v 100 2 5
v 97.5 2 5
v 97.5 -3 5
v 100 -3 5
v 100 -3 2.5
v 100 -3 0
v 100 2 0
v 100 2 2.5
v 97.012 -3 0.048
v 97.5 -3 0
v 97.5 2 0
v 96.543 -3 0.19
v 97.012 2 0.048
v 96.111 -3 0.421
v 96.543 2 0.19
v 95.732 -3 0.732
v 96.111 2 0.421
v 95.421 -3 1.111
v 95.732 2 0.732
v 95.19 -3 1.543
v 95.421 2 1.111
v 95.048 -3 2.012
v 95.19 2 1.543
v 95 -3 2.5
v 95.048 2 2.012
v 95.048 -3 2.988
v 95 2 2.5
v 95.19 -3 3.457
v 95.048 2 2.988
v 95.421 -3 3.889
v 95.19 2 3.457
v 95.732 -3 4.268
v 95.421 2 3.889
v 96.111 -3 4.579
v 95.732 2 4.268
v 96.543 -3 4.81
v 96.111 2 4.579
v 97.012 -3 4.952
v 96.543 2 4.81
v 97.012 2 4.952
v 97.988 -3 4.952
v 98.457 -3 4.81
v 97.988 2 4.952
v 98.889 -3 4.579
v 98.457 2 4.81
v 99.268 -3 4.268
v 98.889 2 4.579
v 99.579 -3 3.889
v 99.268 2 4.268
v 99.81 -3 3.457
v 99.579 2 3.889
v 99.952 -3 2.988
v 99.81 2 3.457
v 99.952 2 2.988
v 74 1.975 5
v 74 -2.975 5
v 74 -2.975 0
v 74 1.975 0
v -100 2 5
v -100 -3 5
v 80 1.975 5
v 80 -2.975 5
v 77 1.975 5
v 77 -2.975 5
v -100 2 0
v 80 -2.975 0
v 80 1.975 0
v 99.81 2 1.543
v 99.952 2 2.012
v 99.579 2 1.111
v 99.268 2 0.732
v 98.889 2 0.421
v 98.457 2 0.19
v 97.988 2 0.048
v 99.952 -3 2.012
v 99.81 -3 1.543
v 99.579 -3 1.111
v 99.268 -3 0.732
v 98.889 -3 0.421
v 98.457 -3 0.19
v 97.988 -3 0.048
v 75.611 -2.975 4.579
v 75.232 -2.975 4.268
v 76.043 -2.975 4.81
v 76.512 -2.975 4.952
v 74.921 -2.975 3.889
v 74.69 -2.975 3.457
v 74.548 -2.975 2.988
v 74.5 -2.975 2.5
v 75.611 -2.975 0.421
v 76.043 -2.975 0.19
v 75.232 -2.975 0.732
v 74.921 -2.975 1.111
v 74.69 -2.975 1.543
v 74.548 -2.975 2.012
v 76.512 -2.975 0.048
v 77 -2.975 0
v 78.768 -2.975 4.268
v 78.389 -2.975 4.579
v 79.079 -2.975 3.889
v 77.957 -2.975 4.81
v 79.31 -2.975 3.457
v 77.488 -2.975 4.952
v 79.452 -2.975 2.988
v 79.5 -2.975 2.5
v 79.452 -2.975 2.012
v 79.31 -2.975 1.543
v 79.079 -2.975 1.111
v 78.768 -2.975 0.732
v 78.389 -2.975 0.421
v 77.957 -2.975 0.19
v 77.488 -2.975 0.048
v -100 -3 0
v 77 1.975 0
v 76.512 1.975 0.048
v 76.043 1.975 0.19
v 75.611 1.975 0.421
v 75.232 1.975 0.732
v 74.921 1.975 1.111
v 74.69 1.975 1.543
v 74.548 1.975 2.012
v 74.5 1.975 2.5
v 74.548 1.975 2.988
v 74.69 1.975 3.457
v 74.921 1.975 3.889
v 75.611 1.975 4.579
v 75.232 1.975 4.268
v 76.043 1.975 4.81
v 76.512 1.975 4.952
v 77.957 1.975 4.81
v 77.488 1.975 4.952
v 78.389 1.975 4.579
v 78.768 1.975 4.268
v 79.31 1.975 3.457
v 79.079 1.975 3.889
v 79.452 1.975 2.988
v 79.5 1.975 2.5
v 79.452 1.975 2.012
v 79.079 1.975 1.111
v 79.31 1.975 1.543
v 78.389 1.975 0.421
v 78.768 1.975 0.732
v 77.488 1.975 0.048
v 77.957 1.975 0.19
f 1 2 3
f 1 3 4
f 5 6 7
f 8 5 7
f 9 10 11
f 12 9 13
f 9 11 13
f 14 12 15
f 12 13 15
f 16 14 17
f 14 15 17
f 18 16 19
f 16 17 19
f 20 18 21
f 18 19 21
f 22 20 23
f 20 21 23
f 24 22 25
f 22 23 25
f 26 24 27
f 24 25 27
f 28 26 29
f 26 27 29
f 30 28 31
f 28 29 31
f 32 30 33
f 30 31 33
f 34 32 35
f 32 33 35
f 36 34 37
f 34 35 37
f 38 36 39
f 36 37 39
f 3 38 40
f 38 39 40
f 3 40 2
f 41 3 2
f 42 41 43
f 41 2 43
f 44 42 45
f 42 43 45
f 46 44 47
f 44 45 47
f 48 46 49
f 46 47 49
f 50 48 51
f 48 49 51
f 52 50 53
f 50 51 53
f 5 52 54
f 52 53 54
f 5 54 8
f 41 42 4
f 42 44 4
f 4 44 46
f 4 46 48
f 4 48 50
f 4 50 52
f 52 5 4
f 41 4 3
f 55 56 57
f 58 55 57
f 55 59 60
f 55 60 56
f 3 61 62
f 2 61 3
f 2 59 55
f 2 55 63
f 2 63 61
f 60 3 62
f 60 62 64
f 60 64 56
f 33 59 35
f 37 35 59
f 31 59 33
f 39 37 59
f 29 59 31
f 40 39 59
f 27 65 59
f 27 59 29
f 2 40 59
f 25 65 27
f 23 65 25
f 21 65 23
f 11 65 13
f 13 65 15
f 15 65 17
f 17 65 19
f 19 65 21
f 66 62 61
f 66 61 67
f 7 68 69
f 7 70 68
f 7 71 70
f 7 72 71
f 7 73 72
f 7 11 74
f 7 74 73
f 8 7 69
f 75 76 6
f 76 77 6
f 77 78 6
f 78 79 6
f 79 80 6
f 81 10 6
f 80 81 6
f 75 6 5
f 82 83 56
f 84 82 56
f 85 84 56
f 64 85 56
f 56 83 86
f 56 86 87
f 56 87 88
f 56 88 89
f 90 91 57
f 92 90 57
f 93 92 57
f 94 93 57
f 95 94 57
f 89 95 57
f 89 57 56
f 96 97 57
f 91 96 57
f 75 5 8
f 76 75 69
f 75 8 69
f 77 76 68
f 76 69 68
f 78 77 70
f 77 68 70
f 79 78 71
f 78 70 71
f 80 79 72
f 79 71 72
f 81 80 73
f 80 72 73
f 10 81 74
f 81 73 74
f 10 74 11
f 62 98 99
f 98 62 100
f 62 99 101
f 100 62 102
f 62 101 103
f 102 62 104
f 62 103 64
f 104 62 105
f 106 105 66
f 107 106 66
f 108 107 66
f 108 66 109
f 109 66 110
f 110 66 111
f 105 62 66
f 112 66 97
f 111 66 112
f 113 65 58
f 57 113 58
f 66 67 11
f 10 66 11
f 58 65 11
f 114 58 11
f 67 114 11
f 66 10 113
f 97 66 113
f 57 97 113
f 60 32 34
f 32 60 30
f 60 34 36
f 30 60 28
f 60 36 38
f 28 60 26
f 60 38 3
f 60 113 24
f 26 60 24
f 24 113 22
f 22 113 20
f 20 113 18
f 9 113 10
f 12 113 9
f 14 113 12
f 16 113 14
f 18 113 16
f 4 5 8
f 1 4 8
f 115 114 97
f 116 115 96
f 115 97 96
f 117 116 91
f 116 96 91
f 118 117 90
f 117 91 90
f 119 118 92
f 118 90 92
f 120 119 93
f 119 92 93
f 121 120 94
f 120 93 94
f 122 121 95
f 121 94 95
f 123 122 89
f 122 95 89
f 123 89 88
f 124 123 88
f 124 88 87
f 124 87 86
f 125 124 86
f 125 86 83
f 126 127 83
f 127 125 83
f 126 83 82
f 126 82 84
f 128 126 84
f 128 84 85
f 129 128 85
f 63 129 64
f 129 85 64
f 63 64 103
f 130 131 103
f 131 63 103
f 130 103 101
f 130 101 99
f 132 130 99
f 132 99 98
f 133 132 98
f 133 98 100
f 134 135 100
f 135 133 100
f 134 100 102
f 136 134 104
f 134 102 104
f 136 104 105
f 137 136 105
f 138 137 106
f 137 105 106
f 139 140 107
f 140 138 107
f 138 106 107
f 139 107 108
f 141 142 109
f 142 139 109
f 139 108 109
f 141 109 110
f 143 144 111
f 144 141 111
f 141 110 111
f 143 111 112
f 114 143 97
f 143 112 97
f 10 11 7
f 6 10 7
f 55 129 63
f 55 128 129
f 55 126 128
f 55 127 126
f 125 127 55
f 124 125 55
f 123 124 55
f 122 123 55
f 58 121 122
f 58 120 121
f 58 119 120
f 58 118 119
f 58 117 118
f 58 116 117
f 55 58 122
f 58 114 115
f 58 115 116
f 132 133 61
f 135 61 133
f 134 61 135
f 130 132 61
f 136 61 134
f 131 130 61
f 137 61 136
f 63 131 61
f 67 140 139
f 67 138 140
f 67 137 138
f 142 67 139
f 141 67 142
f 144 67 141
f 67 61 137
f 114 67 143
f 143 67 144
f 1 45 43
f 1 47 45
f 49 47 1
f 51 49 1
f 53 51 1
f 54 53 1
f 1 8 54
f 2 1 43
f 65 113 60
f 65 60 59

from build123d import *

# Parameters (mm, degrees)
SKETCH1_W           = 200
SKETCH1_H           = 5
BOSS_EXTRUDE1_DEPTH = 5
SKETCH3_R           = 2.5
BOSS_EXTRUDE3_DEPTH = 5
SKETCH6_R           = 2.5
CUT_EXTRUDE6_DEPTH  = 10
SKETCH7_R           = 2.5
CUT_EXTRUDE7_DEPTH  = 10
SKETCH8_W           = 6
SKETCH8_H           = 6
CUT_EXTRUDE8_DEPTH  = 2.475
BOSS_EXTRUDE4_REACH = 102.248
SKETCH9_R           = 2.5
SKETCH7_2_R         = 2.5
BOSS_EXTRUDE5_DEPTH = 5


with BuildPart() as part:
    # Sketch1 → Boss-Extrude1 (new body)
    with BuildSketch(Plane.XY):
        with Locations((0, -0.5)):
            Rectangle(SKETCH1_W, SKETCH1_H)
    extrude(amount=BOSS_EXTRUDE1_DEPTH)

    # Sketch3 → Boss-Extrude3 (add)
    with BuildSketch(Plane.XZ.offset(3)):
        with Locations((96.663551579, 2.5)):
            Circle(SKETCH3_R)
    extrude(amount=-BOSS_EXTRUDE3_DEPTH)

    # Sketch6 → Cut-Extrude6 (cut)
    with BuildSketch(Plane(origin=(0, 2, 0), x_dir=(1, 0, 0), z_dir=(0, 1, 0))):
        with Locations((97.5, -2.5)):
            Circle(SKETCH6_R)
    extrude(amount=-CUT_EXTRUDE6_DEPTH, mode=Mode.SUBTRACT)


with BuildPart() as cut_extrude6_piece_1:
    # of the separate pieces the step leaves, piece 1, a body of its own (cut_extrude6_pieces)
    add(part.part.solids().sort_by_distance((-100, 2, 0))[0])

    # Sketch7 → Cut-Extrude7 (cut)
    with BuildSketch(Plane(origin=(0, 2, 0), x_dir=(1, 0, 0), z_dir=(0, 1, 0))):
        with Locations((-97.5, -2.5)):
            Circle(SKETCH7_R)
    extrude(amount=-CUT_EXTRUDE7_DEPTH, mode=Mode.SUBTRACT)


with BuildPart() as cut_extrude6_piece_2:
    # of the separate pieces the step leaves, piece 2, a body of its own (cut_extrude6_pieces)
    add(part.part.solids().sort_by_distance((100, -3, 0))[0])


with BuildPart() as cut_extrude6_piece_3:
    # of the separate pieces the step leaves, piece 3, a body of its own (cut_extrude6_pieces)
    add(part.part.solids().sort_by_distance((100, 2, 5))[0])


with BuildPart() as cut_extrude7_piece_1:
    # of the separate pieces the step leaves, piece 1, a body of its own (cut_extrude7_pieces)
    add(cut_extrude6_piece_1.part.solids().sort_by_distance((97.5, 2, 0))[0])

    # Sketch8 → Cut-Extrude8 (cut, symmetric)
    with BuildSketch(Plane(origin=(0, -0.5, 0), x_dir=(-1, 0, 0), z_dir=(0, -1, 0))):
        with Locations((-77, -2.713256796)):
            Rectangle(SKETCH8_W, SKETCH8_H)
    extrude(amount=CUT_EXTRUDE8_DEPTH, both=True, mode=Mode.SUBTRACT)

    # Sketch9 → Boss-Extrude4 (add, up to next)
    with BuildSketch(Plane(origin=(0, -2.975, 0), x_dir=(1, 0, 0), z_dir=(0, 1, 0)), mode=Mode.PRIVATE) as boss_extrude4_sk1:
        with Locations(Location((77, -2.5, 0), (0, 0, 90))):
            Circle(SKETCH9_R)
    boss_extrude4_tool1 = extrude(boss_extrude4_sk1.sketch, amount=BOSS_EXTRUDE4_REACH, mode=Mode.PRIVATE) - cut_extrude7_piece_1.part
    add(boss_extrude4_tool1.solids().sort_by_distance((77, -2.975, 2.5))[0])



with BuildPart() as cut_extrude7_piece_2:
    # of the separate pieces the step leaves, piece 2, a body of its own (cut_extrude7_pieces)
    add(cut_extrude6_piece_1.part.solids().sort_by_distance((-100, 2, 0))[0])


with BuildPart() as cut_extrude7_piece_3:
    # of the separate pieces the step leaves, piece 3, a body of its own (cut_extrude7_pieces)
    add(cut_extrude6_piece_1.part.solids().sort_by_distance((-100, -3, 5))[0])


with BuildPart() as cut_extrude7_piece_1_1:
    add(cut_extrude7_piece_1.part)

    add(cut_extrude7_piece_2.part)  # Boss-Extrude5 merges Cut-Extrude7 piece 2

    add(cut_extrude7_piece_3.part)  # Boss-Extrude5 merges Cut-Extrude7 piece 3
    # Sketch7<2> → Boss-Extrude5 (add)
    with BuildSketch(Plane(origin=(0, 2, 0), x_dir=(1, 0, 0), z_dir=(0, 1, 0))):
        with Locations((-97.5, -2.5)):
            Circle(SKETCH7_2_R)
    extrude(amount=-BOSS_EXTRUDE5_DEPTH)


solid = Compound([cut_extrude6_piece_2.part, cut_extrude6_piece_3.part, cut_extrude7_piece_1_1.part])
